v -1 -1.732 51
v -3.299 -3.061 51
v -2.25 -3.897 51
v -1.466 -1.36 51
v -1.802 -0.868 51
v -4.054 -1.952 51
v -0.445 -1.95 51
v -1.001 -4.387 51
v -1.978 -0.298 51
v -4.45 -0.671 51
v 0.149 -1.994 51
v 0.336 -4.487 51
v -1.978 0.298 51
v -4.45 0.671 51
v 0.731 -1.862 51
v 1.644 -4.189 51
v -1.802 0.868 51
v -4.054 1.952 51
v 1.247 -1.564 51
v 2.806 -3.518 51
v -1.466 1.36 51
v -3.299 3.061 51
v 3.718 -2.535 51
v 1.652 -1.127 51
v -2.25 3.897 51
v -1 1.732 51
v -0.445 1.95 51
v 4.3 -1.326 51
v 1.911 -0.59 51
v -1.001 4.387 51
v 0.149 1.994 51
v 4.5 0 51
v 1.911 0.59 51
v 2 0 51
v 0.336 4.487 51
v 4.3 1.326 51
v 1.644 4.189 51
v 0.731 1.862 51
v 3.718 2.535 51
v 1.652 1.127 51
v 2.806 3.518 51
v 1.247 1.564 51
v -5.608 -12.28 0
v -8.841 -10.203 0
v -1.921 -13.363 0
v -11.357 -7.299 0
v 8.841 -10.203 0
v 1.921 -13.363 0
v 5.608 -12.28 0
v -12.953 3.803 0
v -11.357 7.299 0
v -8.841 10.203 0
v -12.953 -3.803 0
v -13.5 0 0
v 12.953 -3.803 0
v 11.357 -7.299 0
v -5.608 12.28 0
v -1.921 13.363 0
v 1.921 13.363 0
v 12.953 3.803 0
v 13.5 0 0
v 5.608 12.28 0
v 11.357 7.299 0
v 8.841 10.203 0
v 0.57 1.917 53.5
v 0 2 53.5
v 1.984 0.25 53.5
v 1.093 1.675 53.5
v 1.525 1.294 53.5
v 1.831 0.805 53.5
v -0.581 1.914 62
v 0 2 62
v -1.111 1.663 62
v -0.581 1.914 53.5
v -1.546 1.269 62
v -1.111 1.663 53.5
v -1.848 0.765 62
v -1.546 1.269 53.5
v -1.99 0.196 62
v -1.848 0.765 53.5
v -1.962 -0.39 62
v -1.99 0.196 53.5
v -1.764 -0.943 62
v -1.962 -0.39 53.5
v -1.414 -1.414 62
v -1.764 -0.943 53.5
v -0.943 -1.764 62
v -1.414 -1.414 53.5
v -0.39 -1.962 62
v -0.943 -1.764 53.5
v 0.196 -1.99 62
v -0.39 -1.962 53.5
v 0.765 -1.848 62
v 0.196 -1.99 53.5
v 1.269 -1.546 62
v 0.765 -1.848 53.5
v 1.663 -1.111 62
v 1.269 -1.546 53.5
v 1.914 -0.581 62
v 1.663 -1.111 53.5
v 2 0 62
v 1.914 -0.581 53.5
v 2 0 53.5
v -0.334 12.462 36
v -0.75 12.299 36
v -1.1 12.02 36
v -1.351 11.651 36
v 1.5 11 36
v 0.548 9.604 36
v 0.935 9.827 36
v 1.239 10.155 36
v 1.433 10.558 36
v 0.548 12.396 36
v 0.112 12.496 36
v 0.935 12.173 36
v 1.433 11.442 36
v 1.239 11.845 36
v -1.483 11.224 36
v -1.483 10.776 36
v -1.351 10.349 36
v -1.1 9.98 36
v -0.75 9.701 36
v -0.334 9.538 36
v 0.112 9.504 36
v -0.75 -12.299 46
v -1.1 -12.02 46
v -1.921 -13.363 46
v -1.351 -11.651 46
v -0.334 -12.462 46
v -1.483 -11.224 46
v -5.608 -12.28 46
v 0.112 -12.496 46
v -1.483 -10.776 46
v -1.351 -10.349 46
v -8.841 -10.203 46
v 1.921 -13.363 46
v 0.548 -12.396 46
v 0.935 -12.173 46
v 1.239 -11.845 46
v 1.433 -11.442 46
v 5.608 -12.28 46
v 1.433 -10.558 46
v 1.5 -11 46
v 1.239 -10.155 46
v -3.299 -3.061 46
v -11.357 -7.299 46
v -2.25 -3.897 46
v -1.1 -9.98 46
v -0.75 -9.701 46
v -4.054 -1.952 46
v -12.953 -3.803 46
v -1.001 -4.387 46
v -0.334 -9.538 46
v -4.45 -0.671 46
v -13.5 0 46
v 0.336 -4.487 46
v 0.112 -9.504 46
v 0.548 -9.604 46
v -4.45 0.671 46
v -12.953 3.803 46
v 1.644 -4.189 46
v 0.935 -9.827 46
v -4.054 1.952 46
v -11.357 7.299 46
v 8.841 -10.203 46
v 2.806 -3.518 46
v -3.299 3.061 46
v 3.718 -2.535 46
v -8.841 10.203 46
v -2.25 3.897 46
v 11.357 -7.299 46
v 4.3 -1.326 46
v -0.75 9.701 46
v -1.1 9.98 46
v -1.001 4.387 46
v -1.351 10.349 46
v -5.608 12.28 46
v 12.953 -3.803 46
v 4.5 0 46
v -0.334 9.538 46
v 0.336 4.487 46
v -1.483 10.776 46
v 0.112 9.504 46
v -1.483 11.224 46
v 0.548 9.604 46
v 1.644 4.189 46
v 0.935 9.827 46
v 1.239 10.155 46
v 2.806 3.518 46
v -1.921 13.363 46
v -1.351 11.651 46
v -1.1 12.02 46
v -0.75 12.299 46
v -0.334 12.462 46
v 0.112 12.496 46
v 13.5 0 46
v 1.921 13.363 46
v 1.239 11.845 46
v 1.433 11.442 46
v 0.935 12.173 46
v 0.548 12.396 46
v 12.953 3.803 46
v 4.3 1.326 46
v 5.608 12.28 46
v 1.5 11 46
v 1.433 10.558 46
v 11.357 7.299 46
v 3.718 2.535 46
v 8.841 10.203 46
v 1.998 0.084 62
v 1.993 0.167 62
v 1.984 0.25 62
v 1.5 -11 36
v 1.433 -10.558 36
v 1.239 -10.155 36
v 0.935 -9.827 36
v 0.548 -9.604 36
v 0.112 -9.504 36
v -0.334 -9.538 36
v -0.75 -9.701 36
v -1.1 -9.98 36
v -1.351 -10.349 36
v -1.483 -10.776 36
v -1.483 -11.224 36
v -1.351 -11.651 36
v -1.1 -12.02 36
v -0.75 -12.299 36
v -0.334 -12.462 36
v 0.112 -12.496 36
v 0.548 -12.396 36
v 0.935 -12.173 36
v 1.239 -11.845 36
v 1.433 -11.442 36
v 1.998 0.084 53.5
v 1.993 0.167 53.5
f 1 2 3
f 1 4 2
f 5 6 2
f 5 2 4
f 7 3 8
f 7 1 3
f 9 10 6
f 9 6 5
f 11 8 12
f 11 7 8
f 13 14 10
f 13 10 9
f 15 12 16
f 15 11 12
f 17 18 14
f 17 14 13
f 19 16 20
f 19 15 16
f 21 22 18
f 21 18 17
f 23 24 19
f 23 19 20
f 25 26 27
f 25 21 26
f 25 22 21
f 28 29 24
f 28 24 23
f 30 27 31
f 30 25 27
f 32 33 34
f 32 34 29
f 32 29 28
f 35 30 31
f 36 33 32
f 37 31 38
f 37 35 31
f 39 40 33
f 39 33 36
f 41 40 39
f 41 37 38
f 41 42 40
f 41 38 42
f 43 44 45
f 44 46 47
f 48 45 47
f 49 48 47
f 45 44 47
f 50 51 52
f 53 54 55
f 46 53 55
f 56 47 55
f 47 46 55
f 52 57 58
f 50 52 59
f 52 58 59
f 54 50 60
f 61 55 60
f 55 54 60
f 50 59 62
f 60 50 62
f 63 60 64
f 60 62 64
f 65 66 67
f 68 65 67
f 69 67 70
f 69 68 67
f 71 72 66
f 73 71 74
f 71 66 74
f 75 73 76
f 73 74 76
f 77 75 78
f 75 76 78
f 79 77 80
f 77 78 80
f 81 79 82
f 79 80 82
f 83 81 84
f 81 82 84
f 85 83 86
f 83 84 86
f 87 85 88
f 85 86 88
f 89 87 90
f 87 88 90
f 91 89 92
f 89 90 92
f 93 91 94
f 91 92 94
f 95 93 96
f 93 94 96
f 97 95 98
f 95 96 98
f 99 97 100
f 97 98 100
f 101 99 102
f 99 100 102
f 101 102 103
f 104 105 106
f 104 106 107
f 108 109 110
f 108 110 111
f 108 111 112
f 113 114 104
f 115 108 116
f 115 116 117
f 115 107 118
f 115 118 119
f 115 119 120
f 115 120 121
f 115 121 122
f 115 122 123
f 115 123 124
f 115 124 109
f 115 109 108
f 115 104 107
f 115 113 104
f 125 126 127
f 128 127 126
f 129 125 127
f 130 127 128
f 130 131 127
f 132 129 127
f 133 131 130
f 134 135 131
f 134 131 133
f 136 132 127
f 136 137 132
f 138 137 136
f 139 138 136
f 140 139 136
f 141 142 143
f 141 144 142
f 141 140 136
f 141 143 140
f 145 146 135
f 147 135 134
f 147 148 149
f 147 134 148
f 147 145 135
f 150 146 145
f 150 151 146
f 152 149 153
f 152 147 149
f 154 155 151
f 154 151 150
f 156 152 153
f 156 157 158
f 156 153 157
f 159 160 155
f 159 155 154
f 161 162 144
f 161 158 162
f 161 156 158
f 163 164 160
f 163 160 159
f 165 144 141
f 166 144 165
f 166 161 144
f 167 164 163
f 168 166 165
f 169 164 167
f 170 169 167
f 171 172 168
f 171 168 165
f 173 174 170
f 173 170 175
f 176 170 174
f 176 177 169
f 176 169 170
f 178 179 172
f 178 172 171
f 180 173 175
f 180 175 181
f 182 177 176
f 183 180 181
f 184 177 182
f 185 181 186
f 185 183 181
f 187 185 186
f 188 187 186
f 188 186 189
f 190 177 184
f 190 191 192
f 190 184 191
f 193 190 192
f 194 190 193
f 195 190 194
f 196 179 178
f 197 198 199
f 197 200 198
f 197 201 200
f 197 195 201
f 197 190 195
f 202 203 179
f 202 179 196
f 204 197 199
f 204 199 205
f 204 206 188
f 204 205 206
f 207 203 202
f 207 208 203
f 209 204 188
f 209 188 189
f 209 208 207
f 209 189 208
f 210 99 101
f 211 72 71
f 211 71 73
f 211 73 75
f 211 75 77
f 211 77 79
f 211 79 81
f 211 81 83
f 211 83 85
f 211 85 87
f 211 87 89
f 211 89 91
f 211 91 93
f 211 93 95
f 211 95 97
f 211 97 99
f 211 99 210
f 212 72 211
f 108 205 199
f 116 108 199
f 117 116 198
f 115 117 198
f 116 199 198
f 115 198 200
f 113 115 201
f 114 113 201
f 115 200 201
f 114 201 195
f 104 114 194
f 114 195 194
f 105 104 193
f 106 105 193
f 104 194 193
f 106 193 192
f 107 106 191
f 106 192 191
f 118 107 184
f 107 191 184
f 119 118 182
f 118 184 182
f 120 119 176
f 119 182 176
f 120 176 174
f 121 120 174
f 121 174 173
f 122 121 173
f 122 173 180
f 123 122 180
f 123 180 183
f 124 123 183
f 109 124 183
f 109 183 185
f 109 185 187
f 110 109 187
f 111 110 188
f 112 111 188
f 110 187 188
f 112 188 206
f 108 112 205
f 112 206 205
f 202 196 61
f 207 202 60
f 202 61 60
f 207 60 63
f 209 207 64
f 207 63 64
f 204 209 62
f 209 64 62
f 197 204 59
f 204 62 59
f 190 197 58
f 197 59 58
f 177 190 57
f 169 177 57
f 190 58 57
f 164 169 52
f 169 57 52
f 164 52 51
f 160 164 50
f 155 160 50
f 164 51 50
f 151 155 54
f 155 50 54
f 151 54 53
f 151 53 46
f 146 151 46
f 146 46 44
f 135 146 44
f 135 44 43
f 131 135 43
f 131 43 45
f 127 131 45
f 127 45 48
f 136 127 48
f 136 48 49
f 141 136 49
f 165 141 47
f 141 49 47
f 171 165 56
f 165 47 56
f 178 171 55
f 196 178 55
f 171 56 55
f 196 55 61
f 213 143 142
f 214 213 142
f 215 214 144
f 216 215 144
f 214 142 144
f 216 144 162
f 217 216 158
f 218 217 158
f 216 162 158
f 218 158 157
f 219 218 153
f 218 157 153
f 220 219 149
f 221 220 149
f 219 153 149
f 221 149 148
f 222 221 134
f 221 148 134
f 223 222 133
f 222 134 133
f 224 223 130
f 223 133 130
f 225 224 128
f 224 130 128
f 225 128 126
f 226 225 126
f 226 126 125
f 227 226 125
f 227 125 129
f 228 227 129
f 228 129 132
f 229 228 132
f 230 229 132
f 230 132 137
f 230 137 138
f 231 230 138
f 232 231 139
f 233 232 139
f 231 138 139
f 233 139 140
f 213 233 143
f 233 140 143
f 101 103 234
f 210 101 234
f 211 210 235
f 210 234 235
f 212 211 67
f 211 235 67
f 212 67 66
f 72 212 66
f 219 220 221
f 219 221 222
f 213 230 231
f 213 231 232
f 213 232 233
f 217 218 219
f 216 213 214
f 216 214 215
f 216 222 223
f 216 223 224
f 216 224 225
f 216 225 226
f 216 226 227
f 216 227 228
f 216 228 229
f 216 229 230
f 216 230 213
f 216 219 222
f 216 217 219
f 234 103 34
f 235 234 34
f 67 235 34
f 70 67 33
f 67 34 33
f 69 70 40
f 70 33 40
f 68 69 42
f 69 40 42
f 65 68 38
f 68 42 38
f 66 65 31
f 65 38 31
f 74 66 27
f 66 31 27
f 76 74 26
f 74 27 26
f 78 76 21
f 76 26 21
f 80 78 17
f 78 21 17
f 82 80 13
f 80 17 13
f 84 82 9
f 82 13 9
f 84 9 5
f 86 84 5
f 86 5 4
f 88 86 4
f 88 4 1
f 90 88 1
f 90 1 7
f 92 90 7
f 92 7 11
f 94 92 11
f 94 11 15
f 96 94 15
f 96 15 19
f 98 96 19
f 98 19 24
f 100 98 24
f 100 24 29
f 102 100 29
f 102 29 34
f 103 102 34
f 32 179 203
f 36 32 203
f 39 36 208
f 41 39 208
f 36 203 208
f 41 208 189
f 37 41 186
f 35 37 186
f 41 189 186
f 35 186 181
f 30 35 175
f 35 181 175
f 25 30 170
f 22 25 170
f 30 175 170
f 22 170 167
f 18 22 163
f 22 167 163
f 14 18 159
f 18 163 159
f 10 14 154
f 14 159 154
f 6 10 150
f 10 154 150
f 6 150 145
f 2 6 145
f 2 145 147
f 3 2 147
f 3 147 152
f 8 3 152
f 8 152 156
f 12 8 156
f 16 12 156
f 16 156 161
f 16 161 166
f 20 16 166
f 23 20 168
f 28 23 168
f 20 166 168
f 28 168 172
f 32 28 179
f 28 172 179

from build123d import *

# Parameters (mm, degrees)
SCHIZZO1_R                   = 13.5
ESTRUSIONE_ESTRUSIONE1_DEPTH = 46
SCHIZZO2_R                   = 4.5
ESTRUSIONE_ESTRUSIONE2_DEPTH = 5
SCHIZZO4_R                   = 2
ESTRUSIONE_ESTRUSIONE3_DEPTH = 2.5
ESTRUSIONE_ESTRUSIONE4_DEPTH = 8.5
SCHIZZO6_R                   = 1.5
TAGLIO_ESTRUSIONE1_DEPTH     = 10


with BuildPart() as part:
    # Schizzo1 → Estrusione-Estrusione1 (new body)
    with BuildSketch(Plane.XY):
        Circle(SCHIZZO1_R)
    extrude(amount=ESTRUSIONE_ESTRUSIONE1_DEPTH)

    # Schizzo2 → Estrusione-Estrusione2 (add)
    with BuildSketch(Plane.XY.offset(46)):
        Circle(SCHIZZO2_R)
    extrude(amount=ESTRUSIONE_ESTRUSIONE2_DEPTH)

    # Schizzo4 → Estrusione-Estrusione3 (add)
    with BuildSketch(Plane.XY.offset(51)):
        Circle(SCHIZZO4_R)
    extrude(amount=ESTRUSIONE_ESTRUSIONE3_DEPTH)

    # Schizzo5 → Estrusione-Estrusione4 (add)
    with BuildSketch(Plane.XY.offset(53.5)):
        with BuildLine():
            Line((1.984313483, 0.25), (0, 2))
            ThreePointArc((0, 2), (-1.414213562, -1.414213562), (2, 0))
            ThreePointArc((2, 0), (1.996074518, 0.125245825), (1.984313483, 0.25))
        make_face()
    extrude(amount=ESTRUSIONE_ESTRUSIONE4_DEPTH)

    # Schizzo6 → Taglio-Estrusione1 (cut)
    with BuildSketch(Plane.XY.offset(46)):
        with Locations((0, 11)):
            Circle(SCHIZZO6_R)
        with Locations((0, -11)):
            Circle(SCHIZZO6_R)
    extrude(amount=-TAGLIO_ESTRUSIONE1_DEPTH, mode=Mode.SUBTRACT)


solid = part.part
